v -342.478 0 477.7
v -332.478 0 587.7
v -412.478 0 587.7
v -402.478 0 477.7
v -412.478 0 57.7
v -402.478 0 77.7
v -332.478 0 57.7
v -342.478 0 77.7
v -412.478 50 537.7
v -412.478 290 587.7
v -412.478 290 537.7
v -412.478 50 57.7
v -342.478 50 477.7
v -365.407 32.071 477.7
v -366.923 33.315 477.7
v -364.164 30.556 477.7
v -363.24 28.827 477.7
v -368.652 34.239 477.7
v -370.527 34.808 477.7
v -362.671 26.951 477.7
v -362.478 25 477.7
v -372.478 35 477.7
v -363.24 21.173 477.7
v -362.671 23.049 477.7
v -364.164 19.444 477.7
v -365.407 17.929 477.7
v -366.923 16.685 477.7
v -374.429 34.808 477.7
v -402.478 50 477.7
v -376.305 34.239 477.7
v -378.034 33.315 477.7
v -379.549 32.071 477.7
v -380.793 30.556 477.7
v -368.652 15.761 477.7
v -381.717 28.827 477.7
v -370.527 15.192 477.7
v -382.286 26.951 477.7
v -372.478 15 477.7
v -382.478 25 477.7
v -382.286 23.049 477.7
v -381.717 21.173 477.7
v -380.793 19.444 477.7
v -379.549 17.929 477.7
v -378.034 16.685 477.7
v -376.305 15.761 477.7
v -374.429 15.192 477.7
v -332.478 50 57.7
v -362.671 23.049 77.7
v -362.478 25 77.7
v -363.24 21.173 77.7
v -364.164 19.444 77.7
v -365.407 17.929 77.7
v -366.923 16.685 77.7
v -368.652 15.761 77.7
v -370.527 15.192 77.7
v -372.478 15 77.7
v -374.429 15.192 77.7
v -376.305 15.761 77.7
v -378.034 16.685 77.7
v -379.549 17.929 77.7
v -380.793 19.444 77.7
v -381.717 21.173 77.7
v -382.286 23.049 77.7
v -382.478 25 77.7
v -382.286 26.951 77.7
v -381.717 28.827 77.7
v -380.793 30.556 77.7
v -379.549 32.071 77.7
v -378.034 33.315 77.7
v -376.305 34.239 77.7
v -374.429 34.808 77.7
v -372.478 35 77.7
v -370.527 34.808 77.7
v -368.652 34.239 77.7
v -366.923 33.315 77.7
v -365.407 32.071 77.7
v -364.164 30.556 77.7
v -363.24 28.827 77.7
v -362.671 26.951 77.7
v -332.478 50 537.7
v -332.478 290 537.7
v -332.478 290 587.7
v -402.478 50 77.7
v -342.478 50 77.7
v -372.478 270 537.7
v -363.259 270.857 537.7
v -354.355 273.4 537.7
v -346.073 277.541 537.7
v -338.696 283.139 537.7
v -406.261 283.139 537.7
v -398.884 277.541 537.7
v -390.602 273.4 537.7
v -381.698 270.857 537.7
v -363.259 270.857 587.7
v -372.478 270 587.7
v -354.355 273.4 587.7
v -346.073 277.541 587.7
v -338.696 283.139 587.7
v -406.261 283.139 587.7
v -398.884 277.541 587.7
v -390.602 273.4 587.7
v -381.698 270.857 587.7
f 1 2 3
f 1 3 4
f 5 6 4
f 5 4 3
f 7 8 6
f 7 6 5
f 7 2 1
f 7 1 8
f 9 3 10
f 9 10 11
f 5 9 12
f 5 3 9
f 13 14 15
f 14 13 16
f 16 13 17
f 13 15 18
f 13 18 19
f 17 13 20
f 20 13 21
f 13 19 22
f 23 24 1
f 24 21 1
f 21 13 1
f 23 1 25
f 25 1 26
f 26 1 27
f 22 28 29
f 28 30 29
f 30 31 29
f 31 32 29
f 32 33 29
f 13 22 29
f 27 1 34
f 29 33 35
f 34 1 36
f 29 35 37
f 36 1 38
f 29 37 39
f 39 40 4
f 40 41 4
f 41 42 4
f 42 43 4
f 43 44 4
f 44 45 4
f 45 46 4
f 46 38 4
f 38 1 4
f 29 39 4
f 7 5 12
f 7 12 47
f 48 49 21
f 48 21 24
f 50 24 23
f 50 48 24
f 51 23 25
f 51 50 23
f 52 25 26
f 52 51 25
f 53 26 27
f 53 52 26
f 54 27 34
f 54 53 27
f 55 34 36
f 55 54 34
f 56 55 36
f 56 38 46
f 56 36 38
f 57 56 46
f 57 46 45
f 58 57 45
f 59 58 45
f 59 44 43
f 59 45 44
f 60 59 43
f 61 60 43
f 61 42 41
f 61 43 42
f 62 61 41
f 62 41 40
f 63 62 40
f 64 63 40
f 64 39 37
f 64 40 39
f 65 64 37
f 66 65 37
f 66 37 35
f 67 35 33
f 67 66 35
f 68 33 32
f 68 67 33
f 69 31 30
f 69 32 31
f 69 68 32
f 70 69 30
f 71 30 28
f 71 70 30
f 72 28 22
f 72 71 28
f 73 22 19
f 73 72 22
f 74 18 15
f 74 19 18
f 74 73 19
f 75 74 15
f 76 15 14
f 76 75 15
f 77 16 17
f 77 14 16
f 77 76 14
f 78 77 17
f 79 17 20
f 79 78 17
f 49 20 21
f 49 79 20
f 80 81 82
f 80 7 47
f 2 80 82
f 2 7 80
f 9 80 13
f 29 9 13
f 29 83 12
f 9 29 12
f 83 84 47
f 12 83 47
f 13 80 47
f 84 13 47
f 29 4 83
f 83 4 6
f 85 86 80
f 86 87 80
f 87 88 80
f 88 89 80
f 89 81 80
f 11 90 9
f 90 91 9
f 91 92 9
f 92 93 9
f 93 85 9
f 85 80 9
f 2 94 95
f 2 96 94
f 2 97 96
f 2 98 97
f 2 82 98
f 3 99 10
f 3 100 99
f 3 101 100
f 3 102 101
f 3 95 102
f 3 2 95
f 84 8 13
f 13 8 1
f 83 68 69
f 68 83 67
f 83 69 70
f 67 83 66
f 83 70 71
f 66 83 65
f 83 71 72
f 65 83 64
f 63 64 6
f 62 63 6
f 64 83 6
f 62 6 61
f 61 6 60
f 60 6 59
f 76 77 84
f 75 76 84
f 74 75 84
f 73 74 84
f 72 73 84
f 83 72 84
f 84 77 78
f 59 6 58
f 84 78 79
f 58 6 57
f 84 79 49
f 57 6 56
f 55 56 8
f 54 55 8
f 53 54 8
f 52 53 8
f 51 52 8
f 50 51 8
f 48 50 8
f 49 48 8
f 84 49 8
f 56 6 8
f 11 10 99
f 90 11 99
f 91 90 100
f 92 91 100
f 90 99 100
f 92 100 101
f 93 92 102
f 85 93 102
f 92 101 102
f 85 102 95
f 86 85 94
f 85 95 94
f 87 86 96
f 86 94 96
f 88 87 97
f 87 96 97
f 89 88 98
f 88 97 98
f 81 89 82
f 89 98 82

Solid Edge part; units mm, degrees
sketch "Sketch1" plane through (0, 0, 0) normal (0, -1, 0) x (1, 0, 0)
  line L0 (-402.4784, 77.6999) -> (-342.4784, 77.6999)
  line L1 (-342.4784, 77.6999) -> (-342.4784, 477.6999)
  line L2 (-342.4784, 477.6999) -> (-402.4784, 477.6999)
  line L3 (-402.4784, 477.6999) -> (-402.4784, 77.6999)
  line L4 (-412.4784, 57.6999) -> (-332.4784, 57.6999)
  line L5 (-332.4784, 57.6999) -> (-332.4784, 587.6999)
  line L6 (-332.4784, 587.6999) -> (-412.4784, 587.6999)
  line L7 (-412.4784, 587.6999) -> (-412.4784, 57.6999)
  dimension "D1" = 400
  dimension "D2" = 60
  dimension "D3" = 80
  dimension "D4" = 530
  dimension "D5" = 20
extrude "Protrusion1" add sketch "Sketch1" against normal blind 50
sketch "Sketch2" plane through (-372.4784, 25, 77.6999) normal (0, 0, 1) x (1, 0, 0)
  circle A0 centre (0, 0) radius 10
extrude "Protrusion2" add sketch "Sketch2" along normal up to surface (400 mm away)
sketch "Sketch3" plane through (-372.4784, 50, 247.6999) normal (0, 1, 0) x (0, 0, 1)
  line L0 (290, -40) -> (340, -40)
  line L1 (340, -40) -> (340, 40)
  line L2 (340, 40) -> (290, 40)
  line L3 (290, 40) -> (290, -40)
  dimension "D1" = 80
  dimension "D2" = 50
  dimension "D3" = 50
extrude "ExtrudedProtrusion_3" add sketch "Sketch3" along normal blind 270
sketch "Sketch4" plane through (-372.4784, 310, 587.6999) normal (0, 0, 1) x (0, 1, 0)
  circle A0 centre (10, 0) radius 50
extrude "Cutout1" cut sketch "Sketch4" against normal through all
